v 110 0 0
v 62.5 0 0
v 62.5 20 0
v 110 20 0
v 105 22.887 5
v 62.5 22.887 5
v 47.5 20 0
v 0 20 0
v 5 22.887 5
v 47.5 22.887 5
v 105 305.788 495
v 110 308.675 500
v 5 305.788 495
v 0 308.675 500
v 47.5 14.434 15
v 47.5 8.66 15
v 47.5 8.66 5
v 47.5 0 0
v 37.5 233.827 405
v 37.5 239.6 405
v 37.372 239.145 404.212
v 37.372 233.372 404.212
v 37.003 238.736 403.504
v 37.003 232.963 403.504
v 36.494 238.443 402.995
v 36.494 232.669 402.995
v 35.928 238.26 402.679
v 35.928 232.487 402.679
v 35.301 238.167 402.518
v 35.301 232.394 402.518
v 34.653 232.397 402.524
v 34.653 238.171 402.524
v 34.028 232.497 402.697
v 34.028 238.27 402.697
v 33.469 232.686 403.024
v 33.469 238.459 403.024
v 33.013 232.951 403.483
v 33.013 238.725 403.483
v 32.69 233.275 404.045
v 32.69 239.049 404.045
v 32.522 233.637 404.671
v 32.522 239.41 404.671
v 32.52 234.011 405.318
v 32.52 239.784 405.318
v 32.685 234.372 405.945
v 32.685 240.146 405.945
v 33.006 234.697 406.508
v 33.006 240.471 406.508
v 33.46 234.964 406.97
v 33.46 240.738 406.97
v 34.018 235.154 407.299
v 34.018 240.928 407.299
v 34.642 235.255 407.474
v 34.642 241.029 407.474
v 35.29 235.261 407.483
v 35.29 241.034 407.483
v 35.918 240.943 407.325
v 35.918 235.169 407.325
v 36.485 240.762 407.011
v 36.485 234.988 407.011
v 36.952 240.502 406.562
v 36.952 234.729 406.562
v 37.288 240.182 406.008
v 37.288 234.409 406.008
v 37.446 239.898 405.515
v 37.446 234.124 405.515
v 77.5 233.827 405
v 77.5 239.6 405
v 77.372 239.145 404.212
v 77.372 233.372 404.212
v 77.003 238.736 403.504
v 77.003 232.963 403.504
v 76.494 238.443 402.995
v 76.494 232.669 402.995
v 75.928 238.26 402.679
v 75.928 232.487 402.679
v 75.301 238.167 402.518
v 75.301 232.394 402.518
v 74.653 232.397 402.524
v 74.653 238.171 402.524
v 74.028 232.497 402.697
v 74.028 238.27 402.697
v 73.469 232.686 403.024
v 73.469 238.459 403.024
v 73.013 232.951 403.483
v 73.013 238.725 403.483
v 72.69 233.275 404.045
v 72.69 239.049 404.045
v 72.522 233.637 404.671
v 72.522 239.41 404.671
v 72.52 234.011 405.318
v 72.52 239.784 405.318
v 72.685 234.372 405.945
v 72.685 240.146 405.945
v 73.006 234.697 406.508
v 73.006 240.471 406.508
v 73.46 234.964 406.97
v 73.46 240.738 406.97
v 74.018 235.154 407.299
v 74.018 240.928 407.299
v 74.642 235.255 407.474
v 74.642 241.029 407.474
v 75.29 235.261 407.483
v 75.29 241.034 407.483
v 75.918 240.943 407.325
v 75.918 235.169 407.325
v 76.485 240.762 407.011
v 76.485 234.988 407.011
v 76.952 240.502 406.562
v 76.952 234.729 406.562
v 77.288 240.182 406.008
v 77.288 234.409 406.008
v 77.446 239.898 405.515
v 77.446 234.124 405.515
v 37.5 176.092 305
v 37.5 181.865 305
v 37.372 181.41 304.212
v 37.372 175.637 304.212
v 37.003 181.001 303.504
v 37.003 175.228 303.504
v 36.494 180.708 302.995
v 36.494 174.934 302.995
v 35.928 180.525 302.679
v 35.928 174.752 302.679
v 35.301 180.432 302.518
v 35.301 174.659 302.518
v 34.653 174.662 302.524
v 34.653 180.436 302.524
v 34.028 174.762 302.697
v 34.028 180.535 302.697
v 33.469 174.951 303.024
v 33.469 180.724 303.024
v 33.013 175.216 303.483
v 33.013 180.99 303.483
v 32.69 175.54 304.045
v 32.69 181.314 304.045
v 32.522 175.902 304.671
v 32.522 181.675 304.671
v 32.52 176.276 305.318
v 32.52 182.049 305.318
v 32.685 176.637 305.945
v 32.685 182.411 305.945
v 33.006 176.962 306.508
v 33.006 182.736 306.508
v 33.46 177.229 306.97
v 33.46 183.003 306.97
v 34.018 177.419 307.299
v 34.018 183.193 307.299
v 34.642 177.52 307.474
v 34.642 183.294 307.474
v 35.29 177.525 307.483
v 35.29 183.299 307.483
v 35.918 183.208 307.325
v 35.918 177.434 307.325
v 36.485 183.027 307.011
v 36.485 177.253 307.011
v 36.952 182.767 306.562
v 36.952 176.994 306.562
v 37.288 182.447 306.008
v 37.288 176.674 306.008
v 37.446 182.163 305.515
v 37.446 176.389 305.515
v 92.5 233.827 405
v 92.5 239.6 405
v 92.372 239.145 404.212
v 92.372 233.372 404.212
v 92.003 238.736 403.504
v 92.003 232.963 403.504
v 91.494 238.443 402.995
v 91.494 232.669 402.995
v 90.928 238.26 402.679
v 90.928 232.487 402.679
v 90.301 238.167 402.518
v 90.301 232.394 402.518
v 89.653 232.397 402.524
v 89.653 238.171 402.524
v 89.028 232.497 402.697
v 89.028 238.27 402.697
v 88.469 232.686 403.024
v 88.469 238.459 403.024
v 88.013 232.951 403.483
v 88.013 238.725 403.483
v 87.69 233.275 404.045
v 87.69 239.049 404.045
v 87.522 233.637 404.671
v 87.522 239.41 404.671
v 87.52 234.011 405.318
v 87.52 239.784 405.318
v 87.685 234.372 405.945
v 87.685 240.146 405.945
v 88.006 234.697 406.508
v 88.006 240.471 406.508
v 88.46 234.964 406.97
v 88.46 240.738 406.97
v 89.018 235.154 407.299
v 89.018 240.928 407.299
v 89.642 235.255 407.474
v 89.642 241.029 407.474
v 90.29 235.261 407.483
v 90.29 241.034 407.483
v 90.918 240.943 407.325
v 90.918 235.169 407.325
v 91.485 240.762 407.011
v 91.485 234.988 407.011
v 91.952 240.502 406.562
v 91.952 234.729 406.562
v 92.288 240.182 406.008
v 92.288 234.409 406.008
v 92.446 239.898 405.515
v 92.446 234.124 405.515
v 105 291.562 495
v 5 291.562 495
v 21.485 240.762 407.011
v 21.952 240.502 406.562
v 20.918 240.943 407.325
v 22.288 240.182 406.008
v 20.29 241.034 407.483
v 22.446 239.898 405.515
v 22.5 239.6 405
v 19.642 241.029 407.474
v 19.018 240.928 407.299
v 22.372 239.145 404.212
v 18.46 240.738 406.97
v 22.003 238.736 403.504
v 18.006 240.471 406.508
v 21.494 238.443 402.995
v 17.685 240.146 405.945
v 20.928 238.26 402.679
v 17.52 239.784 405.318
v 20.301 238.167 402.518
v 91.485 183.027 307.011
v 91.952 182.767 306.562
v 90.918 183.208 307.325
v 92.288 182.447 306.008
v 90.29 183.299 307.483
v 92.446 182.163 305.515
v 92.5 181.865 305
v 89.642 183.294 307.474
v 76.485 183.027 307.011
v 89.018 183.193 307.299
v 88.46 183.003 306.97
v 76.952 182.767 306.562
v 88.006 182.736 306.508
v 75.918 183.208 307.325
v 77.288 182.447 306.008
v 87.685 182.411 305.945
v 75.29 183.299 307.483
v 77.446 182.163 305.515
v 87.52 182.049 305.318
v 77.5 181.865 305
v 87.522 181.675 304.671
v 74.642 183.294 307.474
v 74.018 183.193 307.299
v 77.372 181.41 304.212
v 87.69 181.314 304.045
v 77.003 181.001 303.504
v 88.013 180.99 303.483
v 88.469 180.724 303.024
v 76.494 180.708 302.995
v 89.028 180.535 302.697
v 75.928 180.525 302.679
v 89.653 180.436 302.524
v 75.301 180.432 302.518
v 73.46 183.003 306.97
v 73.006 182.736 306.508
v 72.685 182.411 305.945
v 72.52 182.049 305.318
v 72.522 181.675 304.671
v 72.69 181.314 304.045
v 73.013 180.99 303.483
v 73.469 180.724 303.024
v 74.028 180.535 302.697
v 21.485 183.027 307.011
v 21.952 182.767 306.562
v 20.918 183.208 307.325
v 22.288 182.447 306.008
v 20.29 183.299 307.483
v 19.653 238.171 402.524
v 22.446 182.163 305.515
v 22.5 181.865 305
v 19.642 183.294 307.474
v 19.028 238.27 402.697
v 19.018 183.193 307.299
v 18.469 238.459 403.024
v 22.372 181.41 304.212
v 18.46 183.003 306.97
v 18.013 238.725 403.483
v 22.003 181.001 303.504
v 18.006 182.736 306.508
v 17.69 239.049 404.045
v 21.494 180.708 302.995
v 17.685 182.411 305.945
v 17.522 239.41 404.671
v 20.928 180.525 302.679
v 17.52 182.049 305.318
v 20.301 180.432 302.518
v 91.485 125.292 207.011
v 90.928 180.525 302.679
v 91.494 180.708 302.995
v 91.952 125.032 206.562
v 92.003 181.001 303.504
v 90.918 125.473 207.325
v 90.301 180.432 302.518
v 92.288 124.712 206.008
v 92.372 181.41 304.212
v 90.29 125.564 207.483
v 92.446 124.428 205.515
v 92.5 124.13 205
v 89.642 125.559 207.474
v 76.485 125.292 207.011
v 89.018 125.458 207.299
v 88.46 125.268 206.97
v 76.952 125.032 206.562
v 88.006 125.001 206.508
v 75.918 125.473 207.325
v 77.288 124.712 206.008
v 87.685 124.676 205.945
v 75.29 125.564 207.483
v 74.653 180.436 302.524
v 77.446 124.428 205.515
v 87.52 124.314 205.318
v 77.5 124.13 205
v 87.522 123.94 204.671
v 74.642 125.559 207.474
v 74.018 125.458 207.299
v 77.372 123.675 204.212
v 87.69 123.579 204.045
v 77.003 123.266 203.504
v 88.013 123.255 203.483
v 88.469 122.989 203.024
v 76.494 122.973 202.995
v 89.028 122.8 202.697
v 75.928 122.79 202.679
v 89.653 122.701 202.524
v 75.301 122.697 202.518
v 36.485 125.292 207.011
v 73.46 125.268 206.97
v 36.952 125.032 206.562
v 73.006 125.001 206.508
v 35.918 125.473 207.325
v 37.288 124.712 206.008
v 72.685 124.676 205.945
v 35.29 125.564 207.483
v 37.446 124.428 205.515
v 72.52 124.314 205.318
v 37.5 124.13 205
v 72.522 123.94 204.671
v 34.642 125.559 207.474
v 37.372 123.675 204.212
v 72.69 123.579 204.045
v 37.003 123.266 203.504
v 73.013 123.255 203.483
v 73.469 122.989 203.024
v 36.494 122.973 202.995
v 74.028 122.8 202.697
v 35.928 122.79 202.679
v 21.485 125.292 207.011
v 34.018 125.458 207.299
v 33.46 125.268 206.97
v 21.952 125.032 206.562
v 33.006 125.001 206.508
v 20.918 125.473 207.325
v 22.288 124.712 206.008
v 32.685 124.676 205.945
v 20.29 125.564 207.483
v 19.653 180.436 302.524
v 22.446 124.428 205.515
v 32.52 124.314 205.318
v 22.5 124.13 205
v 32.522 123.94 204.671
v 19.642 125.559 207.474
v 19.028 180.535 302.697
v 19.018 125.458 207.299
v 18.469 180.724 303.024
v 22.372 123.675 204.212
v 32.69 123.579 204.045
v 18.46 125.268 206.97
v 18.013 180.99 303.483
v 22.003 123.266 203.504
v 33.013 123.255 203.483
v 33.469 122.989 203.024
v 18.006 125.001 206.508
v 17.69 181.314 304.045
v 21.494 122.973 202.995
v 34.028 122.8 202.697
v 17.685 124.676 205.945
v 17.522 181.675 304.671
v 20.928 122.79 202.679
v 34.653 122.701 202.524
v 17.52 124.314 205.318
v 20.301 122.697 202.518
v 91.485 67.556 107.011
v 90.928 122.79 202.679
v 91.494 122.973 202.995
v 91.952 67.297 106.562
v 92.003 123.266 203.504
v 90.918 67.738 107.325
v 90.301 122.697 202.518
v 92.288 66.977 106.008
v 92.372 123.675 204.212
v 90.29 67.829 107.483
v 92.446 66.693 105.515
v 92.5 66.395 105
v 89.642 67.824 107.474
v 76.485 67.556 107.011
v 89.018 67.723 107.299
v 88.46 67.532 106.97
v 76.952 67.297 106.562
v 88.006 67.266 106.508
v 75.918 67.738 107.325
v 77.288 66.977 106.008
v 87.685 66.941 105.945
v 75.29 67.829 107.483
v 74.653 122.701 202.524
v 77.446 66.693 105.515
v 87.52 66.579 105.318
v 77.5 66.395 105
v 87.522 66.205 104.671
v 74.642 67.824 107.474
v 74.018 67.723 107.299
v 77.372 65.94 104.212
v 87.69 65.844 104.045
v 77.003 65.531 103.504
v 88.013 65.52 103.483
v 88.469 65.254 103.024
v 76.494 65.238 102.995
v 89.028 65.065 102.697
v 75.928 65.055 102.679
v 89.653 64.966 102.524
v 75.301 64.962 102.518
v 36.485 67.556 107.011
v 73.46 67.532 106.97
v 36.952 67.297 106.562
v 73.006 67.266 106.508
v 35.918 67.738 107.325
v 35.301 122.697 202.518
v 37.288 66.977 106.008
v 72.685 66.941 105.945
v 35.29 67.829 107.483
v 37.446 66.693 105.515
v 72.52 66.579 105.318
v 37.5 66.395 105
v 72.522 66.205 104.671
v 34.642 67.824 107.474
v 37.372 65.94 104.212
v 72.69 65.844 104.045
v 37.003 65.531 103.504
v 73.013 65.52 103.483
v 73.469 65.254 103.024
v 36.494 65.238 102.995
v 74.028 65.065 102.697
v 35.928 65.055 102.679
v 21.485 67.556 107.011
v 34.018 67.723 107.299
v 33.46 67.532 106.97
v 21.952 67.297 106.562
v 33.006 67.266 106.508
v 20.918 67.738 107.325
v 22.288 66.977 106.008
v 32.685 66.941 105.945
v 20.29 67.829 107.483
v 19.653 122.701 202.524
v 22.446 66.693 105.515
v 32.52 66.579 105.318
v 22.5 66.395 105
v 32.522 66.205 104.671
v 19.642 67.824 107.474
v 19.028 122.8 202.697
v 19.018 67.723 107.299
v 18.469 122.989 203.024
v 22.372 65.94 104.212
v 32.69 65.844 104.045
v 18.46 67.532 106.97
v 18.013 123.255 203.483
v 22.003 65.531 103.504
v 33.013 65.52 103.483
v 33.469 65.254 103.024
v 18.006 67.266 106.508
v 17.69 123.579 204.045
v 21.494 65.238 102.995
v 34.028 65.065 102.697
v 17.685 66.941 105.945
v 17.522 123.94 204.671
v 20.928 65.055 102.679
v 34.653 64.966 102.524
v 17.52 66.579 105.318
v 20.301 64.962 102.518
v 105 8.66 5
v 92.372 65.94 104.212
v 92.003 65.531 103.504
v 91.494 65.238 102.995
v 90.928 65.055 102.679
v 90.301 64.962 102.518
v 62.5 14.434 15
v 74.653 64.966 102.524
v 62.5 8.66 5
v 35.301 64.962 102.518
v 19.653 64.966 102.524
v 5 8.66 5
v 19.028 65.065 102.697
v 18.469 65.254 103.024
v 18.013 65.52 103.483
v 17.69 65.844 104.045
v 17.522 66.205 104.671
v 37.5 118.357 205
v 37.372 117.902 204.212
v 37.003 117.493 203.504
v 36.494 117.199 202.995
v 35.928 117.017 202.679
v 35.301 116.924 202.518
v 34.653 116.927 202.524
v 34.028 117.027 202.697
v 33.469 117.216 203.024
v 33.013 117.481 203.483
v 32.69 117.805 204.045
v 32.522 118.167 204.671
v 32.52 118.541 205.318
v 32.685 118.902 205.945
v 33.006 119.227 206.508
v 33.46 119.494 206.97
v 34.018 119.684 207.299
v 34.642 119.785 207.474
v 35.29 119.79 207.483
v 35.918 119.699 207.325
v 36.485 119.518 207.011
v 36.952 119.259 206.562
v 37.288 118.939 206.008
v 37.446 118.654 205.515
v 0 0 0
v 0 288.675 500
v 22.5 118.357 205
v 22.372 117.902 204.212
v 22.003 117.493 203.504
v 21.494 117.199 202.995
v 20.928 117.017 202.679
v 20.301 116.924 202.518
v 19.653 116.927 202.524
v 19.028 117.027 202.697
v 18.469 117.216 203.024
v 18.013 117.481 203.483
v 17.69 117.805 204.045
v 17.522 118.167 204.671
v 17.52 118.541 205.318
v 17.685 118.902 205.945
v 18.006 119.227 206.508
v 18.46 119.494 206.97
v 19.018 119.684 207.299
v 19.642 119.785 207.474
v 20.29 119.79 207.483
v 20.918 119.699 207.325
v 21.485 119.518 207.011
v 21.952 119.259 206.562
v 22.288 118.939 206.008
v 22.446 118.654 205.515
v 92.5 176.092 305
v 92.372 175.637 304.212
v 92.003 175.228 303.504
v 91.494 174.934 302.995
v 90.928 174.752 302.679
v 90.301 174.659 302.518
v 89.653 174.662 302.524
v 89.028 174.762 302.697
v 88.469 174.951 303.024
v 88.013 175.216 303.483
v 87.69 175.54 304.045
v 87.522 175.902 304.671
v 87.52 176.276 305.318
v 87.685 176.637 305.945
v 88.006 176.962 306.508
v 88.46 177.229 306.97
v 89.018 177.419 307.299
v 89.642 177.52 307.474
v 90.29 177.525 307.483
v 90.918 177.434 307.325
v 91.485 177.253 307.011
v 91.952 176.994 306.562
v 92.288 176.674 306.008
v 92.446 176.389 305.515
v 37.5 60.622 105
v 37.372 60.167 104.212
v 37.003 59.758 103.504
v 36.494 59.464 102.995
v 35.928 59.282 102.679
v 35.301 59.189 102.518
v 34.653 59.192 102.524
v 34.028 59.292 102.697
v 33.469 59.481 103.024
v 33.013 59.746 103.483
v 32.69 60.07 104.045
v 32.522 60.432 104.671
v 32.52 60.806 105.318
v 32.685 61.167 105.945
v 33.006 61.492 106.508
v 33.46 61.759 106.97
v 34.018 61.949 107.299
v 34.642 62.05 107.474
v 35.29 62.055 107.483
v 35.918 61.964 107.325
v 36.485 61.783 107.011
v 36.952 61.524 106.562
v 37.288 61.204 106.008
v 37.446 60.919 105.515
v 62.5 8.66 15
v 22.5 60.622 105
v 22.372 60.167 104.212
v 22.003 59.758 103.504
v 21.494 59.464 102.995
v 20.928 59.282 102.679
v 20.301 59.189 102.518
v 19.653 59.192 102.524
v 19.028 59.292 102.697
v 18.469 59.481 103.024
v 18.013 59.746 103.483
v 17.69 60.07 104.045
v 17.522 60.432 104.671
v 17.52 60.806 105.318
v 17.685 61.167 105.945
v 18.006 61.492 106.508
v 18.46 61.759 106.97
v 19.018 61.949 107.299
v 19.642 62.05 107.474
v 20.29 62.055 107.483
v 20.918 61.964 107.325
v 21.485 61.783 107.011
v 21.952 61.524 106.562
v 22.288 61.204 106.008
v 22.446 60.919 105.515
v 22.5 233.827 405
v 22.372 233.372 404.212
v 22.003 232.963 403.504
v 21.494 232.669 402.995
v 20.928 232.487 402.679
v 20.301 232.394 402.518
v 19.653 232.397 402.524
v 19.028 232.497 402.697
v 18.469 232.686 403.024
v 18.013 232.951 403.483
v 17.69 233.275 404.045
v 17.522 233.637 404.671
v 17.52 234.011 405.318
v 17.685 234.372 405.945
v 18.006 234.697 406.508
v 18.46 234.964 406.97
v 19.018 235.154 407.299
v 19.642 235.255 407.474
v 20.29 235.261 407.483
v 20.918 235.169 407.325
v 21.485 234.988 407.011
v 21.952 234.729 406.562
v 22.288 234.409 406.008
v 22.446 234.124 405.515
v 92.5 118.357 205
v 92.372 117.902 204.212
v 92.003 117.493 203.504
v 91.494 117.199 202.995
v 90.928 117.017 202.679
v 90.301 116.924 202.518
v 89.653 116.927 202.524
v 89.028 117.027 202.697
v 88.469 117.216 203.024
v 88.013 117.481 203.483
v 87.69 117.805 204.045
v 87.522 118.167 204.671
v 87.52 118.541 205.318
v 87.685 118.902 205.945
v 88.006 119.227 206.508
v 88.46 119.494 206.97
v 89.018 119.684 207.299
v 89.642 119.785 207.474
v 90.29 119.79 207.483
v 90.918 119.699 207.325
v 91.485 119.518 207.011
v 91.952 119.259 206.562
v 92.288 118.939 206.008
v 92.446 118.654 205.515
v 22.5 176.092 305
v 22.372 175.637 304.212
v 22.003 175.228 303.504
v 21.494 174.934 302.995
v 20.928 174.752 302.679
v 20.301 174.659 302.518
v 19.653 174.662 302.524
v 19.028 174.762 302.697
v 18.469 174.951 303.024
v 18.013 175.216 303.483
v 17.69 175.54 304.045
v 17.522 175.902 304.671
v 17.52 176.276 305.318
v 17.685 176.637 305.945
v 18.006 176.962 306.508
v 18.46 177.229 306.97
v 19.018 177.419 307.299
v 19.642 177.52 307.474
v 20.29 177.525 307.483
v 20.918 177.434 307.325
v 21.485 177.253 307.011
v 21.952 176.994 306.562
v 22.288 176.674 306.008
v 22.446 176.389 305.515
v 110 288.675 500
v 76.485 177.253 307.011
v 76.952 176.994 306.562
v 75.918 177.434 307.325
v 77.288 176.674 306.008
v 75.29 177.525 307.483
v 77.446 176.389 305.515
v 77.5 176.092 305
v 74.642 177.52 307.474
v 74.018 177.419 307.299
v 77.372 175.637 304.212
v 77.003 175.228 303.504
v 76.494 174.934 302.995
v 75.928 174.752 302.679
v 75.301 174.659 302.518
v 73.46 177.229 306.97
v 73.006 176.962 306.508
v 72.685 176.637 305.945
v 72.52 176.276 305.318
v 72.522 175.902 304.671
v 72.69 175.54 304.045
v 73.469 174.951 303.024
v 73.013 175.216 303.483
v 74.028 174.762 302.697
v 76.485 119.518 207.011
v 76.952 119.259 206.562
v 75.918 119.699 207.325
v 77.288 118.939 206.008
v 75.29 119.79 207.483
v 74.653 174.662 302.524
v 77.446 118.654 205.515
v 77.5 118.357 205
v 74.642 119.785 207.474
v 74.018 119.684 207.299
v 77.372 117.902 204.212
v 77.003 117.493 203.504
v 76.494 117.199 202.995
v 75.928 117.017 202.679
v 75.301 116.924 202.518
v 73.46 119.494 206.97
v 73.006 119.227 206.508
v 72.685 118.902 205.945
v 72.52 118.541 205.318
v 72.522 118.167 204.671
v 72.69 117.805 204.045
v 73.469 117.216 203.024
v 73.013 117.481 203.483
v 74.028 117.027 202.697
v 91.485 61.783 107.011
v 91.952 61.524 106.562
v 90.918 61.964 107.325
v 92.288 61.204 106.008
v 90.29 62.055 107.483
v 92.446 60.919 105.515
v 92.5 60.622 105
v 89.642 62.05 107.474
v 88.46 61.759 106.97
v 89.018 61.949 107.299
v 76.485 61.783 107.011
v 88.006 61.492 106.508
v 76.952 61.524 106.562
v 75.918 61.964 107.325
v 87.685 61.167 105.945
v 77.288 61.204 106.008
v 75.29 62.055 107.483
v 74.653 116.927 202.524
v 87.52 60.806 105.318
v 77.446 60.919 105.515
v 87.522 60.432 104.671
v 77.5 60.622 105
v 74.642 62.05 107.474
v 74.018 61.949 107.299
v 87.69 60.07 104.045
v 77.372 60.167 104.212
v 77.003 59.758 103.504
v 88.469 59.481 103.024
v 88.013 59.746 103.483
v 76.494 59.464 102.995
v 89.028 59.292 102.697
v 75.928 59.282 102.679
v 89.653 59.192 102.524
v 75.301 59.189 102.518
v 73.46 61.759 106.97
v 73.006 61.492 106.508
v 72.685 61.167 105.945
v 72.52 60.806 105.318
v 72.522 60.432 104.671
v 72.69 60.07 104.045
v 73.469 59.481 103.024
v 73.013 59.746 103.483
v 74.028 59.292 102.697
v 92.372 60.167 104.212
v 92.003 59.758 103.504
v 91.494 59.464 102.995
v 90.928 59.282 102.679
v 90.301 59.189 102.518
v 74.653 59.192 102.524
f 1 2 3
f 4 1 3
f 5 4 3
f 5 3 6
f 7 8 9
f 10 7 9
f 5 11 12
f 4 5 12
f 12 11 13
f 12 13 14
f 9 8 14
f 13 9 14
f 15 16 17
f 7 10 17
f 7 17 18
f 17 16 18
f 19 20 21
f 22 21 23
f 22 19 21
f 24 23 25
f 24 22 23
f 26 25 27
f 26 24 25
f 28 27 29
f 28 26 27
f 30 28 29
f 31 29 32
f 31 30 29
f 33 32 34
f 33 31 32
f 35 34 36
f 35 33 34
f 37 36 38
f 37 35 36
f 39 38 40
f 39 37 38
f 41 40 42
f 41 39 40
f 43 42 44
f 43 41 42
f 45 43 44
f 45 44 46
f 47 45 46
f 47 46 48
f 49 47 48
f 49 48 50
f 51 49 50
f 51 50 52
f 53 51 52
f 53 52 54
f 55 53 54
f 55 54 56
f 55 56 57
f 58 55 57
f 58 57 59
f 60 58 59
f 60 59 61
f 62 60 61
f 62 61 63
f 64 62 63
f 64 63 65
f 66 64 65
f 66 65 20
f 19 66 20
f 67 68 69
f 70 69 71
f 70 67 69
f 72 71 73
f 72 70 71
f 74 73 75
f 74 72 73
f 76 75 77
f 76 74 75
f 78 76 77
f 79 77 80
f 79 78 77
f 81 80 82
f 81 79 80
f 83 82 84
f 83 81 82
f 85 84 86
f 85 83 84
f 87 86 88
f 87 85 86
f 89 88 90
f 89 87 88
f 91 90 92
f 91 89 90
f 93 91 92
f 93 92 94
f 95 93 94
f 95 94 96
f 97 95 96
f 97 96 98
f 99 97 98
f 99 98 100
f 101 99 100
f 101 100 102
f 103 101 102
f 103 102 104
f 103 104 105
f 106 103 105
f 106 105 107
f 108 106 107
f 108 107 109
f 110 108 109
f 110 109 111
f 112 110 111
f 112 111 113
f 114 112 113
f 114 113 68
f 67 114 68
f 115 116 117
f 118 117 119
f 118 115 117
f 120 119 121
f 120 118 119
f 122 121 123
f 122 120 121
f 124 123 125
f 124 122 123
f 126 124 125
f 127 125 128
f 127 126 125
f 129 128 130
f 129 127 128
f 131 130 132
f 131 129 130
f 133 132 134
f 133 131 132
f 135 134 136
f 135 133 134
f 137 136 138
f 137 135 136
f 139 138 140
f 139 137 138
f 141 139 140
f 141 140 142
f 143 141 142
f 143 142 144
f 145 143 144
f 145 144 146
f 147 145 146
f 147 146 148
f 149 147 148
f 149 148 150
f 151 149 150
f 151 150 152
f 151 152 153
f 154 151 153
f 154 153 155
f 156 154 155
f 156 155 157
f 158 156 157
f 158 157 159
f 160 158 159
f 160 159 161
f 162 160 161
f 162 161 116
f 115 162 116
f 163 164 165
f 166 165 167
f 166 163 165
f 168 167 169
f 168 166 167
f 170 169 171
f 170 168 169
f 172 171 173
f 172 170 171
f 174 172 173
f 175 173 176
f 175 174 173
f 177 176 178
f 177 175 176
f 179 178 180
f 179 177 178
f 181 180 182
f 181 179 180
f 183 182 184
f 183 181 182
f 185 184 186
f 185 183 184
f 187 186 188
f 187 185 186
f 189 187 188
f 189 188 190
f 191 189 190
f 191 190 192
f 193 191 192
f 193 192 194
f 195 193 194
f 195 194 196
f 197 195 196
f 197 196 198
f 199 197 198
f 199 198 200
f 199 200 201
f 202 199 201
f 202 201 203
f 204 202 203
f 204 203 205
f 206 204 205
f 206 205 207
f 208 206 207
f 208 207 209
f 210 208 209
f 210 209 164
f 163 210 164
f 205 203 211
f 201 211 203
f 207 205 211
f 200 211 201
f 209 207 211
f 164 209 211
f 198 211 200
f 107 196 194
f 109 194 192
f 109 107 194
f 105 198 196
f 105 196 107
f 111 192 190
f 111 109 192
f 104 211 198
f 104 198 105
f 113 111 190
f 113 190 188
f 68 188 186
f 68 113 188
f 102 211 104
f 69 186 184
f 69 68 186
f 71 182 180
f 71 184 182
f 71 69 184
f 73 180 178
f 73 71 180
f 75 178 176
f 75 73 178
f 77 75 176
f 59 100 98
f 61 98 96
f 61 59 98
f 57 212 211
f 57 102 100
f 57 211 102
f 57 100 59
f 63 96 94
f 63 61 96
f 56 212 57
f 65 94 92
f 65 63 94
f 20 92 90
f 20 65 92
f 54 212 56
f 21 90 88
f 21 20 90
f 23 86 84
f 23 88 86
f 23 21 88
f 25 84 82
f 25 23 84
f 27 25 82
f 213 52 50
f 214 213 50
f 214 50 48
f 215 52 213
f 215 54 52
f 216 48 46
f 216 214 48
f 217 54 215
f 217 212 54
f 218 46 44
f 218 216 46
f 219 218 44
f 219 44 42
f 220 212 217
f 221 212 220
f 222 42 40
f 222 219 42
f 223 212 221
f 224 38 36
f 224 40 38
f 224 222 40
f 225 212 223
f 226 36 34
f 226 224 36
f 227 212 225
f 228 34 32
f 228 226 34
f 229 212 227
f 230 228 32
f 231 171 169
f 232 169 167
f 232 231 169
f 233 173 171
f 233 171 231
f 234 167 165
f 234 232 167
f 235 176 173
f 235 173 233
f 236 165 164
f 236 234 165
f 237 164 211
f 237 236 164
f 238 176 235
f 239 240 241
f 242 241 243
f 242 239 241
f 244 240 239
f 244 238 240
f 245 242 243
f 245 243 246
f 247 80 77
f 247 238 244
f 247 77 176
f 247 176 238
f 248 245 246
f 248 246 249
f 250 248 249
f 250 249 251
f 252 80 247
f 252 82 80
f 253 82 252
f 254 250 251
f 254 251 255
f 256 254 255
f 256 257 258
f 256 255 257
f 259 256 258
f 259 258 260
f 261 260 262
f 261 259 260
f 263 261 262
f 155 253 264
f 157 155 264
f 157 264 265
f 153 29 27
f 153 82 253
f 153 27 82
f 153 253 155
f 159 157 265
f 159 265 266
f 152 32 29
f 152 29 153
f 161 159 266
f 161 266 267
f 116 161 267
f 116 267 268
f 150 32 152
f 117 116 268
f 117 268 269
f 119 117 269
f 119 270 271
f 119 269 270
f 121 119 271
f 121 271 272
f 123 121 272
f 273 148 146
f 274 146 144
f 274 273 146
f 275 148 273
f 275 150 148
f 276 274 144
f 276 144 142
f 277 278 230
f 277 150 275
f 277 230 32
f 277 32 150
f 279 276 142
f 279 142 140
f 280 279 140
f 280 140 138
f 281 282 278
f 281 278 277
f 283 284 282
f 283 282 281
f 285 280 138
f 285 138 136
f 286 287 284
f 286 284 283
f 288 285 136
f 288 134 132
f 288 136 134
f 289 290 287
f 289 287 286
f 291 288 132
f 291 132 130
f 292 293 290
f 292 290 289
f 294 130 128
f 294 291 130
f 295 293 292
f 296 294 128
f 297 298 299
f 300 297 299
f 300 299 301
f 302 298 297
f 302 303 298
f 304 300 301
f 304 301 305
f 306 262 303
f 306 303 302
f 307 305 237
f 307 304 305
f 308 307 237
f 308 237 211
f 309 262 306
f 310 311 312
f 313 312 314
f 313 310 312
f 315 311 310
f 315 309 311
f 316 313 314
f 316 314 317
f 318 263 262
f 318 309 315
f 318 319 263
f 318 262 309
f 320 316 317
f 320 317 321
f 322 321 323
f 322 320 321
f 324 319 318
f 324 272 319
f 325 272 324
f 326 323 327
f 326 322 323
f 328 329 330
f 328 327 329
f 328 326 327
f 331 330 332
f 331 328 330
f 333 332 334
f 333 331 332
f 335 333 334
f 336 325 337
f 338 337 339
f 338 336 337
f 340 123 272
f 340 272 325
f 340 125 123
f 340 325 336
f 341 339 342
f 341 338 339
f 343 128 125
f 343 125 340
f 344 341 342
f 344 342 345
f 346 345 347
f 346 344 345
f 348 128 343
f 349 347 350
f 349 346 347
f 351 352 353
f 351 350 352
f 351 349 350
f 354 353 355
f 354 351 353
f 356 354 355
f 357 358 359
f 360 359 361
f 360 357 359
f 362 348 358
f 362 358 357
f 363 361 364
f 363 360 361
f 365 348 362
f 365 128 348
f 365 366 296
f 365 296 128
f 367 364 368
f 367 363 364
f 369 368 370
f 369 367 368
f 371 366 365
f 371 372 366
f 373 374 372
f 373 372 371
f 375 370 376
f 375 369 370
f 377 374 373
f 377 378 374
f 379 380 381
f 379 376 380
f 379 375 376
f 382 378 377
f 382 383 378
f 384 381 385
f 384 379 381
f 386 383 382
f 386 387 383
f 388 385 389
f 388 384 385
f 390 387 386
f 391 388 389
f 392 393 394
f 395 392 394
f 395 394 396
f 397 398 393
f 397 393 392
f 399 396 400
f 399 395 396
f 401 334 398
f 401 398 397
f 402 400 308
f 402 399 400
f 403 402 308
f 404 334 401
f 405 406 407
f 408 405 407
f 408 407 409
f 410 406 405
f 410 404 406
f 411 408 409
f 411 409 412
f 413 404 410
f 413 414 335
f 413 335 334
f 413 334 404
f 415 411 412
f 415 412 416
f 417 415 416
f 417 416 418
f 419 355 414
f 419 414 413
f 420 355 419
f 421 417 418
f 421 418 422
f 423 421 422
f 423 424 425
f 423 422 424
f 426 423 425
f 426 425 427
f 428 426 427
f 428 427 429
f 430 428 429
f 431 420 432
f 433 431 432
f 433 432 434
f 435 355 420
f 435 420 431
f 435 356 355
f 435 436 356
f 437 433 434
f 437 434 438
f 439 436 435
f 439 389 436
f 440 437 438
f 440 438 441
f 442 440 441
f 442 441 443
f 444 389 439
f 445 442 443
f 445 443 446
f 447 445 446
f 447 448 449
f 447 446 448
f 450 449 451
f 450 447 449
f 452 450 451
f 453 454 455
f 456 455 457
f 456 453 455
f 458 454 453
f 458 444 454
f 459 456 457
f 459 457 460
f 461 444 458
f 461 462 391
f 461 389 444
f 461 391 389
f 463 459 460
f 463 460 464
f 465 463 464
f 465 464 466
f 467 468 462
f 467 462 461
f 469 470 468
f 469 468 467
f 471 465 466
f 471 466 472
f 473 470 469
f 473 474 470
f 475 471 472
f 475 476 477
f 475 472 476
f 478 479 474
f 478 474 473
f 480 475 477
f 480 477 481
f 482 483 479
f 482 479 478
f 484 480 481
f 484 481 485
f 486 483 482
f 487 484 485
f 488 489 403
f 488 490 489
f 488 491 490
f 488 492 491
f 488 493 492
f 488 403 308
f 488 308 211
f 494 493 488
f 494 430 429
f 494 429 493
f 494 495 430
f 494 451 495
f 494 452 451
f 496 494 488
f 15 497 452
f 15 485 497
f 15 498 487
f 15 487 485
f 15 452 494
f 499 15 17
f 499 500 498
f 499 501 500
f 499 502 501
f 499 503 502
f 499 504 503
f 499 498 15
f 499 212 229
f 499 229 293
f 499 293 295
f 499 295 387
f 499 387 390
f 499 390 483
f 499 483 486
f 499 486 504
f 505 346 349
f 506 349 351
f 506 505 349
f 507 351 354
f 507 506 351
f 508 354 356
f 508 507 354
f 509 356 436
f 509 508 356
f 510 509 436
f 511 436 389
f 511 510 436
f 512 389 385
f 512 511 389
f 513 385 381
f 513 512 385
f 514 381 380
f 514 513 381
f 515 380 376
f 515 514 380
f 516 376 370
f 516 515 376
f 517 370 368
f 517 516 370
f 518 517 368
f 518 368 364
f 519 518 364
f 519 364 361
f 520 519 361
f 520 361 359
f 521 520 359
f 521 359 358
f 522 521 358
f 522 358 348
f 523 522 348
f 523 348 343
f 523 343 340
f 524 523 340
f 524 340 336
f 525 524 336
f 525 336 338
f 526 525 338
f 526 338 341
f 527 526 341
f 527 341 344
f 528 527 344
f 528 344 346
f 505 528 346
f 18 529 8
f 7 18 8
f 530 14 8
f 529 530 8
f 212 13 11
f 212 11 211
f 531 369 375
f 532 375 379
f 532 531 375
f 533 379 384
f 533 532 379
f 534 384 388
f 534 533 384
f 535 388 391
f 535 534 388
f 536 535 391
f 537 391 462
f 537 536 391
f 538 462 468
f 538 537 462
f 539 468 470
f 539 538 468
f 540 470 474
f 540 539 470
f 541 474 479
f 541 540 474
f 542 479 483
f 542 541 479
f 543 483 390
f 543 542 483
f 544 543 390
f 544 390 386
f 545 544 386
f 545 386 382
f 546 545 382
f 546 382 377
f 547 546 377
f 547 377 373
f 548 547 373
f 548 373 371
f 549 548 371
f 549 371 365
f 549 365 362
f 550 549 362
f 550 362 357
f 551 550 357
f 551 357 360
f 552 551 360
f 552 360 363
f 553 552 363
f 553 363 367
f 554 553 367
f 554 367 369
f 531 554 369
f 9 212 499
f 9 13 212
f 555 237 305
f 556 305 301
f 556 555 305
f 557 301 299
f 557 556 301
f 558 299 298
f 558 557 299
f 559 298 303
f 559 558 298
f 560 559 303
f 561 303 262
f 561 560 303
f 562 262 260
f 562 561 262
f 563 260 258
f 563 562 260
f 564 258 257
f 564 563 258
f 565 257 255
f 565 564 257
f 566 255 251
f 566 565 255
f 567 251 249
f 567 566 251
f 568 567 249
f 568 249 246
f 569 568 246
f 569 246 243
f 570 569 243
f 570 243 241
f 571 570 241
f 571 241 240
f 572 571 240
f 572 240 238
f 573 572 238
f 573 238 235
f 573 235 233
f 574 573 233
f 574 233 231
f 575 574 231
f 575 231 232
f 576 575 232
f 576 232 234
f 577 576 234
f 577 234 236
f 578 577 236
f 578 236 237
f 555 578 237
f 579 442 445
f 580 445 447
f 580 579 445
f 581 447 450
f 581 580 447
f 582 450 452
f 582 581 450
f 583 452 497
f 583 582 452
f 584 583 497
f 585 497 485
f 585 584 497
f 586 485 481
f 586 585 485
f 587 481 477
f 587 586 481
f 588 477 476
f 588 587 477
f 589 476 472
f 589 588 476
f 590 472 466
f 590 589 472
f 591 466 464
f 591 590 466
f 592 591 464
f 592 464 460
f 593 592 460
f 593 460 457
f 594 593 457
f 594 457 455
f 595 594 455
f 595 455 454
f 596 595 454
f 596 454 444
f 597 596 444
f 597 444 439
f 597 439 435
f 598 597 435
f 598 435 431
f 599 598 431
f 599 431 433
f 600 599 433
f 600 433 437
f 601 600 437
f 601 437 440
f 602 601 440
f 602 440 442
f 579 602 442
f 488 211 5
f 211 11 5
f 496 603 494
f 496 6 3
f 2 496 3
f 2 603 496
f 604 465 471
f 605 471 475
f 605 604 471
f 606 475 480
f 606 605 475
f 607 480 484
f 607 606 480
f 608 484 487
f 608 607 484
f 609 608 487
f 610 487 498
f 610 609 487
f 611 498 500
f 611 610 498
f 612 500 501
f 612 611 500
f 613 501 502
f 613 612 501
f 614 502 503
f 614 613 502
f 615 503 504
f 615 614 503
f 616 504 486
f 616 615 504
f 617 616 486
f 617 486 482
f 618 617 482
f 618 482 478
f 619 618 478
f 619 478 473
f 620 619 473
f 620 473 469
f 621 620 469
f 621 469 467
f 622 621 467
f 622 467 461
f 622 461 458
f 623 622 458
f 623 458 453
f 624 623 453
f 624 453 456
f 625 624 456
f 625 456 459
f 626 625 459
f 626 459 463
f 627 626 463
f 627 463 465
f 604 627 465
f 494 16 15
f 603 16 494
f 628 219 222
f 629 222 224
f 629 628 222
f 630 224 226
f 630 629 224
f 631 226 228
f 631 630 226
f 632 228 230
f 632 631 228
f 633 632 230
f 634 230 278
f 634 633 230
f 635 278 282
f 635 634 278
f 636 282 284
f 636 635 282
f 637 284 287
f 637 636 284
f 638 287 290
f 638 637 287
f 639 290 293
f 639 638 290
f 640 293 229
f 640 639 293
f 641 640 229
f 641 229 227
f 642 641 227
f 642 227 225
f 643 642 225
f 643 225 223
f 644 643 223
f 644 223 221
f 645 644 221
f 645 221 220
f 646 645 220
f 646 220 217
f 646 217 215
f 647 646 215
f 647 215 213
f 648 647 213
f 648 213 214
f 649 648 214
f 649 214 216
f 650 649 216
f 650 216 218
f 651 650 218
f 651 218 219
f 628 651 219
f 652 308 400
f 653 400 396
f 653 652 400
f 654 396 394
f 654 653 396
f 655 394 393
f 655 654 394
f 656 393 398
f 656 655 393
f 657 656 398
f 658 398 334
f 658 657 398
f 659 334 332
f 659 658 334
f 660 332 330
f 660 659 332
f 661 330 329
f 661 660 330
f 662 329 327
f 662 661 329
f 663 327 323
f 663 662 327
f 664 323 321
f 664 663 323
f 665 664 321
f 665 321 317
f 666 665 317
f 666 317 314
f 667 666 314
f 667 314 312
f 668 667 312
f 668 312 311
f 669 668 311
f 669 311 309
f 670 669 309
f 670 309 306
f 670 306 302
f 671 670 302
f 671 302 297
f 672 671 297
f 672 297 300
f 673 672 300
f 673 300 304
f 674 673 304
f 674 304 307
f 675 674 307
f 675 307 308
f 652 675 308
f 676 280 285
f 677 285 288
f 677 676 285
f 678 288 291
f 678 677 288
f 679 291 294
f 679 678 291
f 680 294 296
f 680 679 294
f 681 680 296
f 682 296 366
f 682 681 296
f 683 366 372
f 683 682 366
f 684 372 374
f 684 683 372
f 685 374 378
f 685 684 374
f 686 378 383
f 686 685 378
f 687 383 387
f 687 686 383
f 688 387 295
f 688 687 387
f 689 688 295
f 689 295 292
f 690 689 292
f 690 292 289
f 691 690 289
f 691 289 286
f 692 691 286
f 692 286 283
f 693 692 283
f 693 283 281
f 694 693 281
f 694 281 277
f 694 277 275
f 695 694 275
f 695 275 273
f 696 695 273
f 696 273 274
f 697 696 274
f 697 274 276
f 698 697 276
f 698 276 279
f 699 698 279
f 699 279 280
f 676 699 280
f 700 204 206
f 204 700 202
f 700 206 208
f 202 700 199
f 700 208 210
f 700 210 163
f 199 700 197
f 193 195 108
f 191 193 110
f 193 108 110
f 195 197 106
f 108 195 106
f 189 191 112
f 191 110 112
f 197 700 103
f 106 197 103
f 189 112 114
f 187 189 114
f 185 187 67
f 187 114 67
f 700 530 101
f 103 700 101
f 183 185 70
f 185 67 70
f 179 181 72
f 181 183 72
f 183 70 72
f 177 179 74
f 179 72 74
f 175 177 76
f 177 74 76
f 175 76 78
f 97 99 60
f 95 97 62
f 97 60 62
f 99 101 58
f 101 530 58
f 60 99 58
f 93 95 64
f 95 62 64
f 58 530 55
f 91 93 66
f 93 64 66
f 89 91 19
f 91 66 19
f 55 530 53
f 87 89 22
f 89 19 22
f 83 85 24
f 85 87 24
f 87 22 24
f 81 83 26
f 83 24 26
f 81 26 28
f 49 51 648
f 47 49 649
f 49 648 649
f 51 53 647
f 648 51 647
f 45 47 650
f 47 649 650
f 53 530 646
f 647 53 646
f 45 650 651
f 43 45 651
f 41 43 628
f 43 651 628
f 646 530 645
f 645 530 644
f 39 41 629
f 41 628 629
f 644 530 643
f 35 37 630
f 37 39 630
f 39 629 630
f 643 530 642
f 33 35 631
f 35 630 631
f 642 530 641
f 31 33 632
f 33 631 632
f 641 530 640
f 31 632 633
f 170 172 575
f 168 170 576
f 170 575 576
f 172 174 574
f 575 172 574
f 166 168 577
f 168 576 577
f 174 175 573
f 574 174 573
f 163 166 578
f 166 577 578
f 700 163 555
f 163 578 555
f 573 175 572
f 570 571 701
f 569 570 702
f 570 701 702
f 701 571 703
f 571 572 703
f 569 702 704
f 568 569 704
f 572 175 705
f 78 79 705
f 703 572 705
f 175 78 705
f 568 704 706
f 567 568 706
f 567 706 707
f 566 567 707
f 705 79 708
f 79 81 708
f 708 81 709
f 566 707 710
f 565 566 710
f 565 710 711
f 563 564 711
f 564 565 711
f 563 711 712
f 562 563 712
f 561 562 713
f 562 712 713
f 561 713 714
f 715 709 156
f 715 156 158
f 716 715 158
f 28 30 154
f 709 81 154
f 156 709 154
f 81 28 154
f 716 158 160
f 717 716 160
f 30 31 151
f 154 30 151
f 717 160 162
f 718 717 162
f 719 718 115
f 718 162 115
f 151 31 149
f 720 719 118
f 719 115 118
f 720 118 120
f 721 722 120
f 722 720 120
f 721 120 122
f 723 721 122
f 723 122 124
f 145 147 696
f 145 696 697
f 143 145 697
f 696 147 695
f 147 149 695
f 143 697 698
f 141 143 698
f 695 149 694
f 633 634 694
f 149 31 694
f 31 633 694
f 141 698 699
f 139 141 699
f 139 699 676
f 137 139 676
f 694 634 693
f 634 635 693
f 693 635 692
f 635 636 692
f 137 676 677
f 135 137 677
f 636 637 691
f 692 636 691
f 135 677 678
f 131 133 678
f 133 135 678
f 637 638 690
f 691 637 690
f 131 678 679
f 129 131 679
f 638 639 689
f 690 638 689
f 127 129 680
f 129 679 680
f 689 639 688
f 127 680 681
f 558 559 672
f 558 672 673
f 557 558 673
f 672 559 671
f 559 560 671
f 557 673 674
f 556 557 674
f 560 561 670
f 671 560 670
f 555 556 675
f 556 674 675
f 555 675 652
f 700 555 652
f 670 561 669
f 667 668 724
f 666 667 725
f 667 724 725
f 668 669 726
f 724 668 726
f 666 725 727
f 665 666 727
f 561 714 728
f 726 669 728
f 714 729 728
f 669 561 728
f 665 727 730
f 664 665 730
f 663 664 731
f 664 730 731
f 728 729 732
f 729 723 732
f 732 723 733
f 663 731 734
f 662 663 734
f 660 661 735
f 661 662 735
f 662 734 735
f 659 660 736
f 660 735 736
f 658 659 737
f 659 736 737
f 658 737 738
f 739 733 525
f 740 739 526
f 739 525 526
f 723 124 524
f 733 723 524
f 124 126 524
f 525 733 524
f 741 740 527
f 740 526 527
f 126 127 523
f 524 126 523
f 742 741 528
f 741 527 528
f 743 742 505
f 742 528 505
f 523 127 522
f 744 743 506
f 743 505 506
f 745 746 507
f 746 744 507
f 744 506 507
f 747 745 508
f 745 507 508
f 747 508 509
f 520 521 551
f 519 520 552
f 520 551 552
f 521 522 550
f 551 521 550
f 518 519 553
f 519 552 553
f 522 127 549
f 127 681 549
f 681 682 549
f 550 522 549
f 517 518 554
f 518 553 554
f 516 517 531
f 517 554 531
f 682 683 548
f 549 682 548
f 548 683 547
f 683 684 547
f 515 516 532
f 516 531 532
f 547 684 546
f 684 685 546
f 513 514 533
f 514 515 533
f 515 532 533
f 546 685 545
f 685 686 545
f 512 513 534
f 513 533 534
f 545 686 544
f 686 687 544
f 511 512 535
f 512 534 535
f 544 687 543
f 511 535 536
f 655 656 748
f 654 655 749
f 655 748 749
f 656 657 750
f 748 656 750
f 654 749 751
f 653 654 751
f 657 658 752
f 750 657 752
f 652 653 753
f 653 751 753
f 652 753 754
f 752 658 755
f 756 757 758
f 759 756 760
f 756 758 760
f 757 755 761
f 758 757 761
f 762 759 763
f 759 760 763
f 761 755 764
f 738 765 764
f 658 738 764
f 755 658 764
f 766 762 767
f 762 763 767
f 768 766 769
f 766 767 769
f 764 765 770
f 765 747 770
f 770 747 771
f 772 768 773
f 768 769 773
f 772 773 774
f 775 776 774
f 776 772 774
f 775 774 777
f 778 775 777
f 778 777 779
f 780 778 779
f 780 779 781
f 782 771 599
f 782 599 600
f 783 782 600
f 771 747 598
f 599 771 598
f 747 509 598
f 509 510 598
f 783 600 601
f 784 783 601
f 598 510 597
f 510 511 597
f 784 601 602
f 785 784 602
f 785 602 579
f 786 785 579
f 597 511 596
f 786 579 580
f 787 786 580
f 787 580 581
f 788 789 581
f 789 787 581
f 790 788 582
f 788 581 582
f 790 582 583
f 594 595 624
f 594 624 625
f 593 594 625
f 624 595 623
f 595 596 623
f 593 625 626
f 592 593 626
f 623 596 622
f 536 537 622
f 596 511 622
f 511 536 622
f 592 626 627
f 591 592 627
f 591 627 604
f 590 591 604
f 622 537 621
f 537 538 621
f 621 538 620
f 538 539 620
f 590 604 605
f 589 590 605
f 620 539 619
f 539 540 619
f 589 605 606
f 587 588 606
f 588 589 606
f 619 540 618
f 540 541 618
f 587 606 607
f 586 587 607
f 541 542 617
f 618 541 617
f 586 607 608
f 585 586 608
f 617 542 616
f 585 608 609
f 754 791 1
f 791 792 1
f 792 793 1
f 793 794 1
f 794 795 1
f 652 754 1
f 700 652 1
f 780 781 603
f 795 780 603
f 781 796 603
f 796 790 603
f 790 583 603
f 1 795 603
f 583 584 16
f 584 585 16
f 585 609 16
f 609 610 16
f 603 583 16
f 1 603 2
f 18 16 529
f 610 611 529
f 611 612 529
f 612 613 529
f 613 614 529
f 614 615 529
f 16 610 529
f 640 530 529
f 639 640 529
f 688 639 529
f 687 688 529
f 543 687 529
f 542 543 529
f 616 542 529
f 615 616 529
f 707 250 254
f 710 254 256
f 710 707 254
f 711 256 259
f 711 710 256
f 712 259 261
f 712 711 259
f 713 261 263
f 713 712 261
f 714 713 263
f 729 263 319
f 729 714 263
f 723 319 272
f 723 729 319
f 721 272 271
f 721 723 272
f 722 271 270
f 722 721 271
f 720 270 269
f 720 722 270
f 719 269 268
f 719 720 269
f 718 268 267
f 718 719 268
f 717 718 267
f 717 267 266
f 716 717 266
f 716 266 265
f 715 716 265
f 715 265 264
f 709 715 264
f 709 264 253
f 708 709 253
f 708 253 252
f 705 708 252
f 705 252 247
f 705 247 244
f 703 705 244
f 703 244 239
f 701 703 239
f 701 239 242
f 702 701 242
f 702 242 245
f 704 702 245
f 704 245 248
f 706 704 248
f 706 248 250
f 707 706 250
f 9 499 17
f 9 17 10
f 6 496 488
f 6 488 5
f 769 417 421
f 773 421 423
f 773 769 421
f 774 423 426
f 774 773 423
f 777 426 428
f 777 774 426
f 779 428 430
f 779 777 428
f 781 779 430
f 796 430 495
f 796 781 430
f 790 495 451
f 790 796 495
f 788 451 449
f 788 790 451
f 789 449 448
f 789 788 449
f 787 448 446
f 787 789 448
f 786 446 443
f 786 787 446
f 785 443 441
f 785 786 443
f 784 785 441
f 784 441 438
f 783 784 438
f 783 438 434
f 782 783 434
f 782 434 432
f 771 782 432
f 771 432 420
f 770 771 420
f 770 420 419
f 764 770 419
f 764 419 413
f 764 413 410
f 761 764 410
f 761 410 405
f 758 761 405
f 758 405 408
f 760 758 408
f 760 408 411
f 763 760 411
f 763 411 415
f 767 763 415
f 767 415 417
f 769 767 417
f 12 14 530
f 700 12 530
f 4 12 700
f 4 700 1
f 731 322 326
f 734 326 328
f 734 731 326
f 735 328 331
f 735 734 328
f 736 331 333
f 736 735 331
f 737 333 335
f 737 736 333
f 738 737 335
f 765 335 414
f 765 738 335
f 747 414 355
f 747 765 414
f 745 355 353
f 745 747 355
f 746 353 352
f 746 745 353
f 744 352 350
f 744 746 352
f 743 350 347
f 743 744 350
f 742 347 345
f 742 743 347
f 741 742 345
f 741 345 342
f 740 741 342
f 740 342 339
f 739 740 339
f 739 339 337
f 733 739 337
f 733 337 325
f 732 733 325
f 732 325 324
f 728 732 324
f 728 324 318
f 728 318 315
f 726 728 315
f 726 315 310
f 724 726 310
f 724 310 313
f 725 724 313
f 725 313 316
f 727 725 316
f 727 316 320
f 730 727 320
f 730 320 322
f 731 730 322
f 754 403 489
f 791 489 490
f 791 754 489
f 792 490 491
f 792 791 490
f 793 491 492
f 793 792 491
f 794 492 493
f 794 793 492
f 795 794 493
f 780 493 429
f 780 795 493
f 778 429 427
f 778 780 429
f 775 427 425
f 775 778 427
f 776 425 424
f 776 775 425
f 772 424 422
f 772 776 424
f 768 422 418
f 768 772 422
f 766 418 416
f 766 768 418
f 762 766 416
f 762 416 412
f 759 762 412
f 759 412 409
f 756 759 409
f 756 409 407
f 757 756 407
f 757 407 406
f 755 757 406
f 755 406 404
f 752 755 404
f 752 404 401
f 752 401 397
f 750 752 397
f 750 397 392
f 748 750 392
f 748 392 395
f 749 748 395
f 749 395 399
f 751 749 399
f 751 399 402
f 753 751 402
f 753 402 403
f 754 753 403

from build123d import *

# Parameters (mm, degrees)
BOSS_EXTRUDE1_DEPTH = 110
CUT_EXTRUDE1_DEPTH  = 100
SKETCH4_W           = 15
SKETCH4_H           = 30
CUT_EXTRUDE2_DEPTH  = 90
SKETCH7_R           = 2.5
CUT_EXTRUDE3_DEPTH  = 413


with BuildPart() as part:
    # Sketch1 → Boss-Extrude1 (new body)
    with BuildSketch(Plane(origin=(0, 0, 0), x_dir=(0, 0, -1), z_dir=(1, 0, 0))):
        Polygon((0, 20), (-500, 308.675134595), (-500, 288.675134595), (0, 0), align=None)
    extrude(amount=BOSS_EXTRUDE1_DEPTH)

    # Sketch3 → Cut-Extrude1 (cut)
    with BuildSketch(Plane(origin=(5, 0, 0), x_dir=(0, 0, -1), z_dir=(1, 0, 0))):
        Polygon((-495, 291.561885941), (-5, 8.660254038), (-5, 22.886751346), (-495, 305.788383249), align=None)
    extrude(amount=CUT_EXTRUDE1_DEPTH, mode=Mode.SUBTRACT)

    # Sketch4 → Cut-Extrude2 (cut)
    with BuildSketch(Plane(origin=(0, 0, 0), x_dir=(1, 0, 0), z_dir=(0, 1, 0))):
        with Locations((55, 0)):
            Rectangle(SKETCH4_W, SKETCH4_H)
    extrude(amount=CUT_EXTRUDE2_DEPTH, mode=Mode.SUBTRACT)

    # Sketch7 → Cut-Extrude3 (cut)
    with BuildSketch(Plane(origin=(0, 0, 0), x_dir=(1, 0, 0), z_dir=(0, 1, 0))):
        with Locations((20, -105)):
            Circle(SKETCH7_R)
        with Locations((90, -105)):
            Circle(SKETCH7_R)
        with Locations((20, -205)):
            Circle(SKETCH7_R)
        with Locations((20, -305)):
            Circle(SKETCH7_R)
        with Locations((20, -405)):
            Circle(SKETCH7_R)
        with Locations((35, -205)):
            Circle(SKETCH7_R)
        with Locations((35, -305)):
            Circle(SKETCH7_R)
        with Locations((35, -405)):
            Circle(SKETCH7_R)
        with Locations((35, -105)):
            Circle(SKETCH7_R)
        with Locations((90, -205)):
            Circle(SKETCH7_R)
        with Locations((90, -305)):
            Circle(SKETCH7_R)
        with Locations((90, -405)):
            Circle(SKETCH7_R)
        with Locations((75, -205)):
            Circle(SKETCH7_R)
        with Locations((75, -305)):
            Circle(SKETCH7_R)
        with Locations((75, -405)):
            Circle(SKETCH7_R)
        with Locations((75, -105)):
            Circle(SKETCH7_R)
    extrude(amount=CUT_EXTRUDE3_DEPTH, mode=Mode.SUBTRACT)


solid = part.part
